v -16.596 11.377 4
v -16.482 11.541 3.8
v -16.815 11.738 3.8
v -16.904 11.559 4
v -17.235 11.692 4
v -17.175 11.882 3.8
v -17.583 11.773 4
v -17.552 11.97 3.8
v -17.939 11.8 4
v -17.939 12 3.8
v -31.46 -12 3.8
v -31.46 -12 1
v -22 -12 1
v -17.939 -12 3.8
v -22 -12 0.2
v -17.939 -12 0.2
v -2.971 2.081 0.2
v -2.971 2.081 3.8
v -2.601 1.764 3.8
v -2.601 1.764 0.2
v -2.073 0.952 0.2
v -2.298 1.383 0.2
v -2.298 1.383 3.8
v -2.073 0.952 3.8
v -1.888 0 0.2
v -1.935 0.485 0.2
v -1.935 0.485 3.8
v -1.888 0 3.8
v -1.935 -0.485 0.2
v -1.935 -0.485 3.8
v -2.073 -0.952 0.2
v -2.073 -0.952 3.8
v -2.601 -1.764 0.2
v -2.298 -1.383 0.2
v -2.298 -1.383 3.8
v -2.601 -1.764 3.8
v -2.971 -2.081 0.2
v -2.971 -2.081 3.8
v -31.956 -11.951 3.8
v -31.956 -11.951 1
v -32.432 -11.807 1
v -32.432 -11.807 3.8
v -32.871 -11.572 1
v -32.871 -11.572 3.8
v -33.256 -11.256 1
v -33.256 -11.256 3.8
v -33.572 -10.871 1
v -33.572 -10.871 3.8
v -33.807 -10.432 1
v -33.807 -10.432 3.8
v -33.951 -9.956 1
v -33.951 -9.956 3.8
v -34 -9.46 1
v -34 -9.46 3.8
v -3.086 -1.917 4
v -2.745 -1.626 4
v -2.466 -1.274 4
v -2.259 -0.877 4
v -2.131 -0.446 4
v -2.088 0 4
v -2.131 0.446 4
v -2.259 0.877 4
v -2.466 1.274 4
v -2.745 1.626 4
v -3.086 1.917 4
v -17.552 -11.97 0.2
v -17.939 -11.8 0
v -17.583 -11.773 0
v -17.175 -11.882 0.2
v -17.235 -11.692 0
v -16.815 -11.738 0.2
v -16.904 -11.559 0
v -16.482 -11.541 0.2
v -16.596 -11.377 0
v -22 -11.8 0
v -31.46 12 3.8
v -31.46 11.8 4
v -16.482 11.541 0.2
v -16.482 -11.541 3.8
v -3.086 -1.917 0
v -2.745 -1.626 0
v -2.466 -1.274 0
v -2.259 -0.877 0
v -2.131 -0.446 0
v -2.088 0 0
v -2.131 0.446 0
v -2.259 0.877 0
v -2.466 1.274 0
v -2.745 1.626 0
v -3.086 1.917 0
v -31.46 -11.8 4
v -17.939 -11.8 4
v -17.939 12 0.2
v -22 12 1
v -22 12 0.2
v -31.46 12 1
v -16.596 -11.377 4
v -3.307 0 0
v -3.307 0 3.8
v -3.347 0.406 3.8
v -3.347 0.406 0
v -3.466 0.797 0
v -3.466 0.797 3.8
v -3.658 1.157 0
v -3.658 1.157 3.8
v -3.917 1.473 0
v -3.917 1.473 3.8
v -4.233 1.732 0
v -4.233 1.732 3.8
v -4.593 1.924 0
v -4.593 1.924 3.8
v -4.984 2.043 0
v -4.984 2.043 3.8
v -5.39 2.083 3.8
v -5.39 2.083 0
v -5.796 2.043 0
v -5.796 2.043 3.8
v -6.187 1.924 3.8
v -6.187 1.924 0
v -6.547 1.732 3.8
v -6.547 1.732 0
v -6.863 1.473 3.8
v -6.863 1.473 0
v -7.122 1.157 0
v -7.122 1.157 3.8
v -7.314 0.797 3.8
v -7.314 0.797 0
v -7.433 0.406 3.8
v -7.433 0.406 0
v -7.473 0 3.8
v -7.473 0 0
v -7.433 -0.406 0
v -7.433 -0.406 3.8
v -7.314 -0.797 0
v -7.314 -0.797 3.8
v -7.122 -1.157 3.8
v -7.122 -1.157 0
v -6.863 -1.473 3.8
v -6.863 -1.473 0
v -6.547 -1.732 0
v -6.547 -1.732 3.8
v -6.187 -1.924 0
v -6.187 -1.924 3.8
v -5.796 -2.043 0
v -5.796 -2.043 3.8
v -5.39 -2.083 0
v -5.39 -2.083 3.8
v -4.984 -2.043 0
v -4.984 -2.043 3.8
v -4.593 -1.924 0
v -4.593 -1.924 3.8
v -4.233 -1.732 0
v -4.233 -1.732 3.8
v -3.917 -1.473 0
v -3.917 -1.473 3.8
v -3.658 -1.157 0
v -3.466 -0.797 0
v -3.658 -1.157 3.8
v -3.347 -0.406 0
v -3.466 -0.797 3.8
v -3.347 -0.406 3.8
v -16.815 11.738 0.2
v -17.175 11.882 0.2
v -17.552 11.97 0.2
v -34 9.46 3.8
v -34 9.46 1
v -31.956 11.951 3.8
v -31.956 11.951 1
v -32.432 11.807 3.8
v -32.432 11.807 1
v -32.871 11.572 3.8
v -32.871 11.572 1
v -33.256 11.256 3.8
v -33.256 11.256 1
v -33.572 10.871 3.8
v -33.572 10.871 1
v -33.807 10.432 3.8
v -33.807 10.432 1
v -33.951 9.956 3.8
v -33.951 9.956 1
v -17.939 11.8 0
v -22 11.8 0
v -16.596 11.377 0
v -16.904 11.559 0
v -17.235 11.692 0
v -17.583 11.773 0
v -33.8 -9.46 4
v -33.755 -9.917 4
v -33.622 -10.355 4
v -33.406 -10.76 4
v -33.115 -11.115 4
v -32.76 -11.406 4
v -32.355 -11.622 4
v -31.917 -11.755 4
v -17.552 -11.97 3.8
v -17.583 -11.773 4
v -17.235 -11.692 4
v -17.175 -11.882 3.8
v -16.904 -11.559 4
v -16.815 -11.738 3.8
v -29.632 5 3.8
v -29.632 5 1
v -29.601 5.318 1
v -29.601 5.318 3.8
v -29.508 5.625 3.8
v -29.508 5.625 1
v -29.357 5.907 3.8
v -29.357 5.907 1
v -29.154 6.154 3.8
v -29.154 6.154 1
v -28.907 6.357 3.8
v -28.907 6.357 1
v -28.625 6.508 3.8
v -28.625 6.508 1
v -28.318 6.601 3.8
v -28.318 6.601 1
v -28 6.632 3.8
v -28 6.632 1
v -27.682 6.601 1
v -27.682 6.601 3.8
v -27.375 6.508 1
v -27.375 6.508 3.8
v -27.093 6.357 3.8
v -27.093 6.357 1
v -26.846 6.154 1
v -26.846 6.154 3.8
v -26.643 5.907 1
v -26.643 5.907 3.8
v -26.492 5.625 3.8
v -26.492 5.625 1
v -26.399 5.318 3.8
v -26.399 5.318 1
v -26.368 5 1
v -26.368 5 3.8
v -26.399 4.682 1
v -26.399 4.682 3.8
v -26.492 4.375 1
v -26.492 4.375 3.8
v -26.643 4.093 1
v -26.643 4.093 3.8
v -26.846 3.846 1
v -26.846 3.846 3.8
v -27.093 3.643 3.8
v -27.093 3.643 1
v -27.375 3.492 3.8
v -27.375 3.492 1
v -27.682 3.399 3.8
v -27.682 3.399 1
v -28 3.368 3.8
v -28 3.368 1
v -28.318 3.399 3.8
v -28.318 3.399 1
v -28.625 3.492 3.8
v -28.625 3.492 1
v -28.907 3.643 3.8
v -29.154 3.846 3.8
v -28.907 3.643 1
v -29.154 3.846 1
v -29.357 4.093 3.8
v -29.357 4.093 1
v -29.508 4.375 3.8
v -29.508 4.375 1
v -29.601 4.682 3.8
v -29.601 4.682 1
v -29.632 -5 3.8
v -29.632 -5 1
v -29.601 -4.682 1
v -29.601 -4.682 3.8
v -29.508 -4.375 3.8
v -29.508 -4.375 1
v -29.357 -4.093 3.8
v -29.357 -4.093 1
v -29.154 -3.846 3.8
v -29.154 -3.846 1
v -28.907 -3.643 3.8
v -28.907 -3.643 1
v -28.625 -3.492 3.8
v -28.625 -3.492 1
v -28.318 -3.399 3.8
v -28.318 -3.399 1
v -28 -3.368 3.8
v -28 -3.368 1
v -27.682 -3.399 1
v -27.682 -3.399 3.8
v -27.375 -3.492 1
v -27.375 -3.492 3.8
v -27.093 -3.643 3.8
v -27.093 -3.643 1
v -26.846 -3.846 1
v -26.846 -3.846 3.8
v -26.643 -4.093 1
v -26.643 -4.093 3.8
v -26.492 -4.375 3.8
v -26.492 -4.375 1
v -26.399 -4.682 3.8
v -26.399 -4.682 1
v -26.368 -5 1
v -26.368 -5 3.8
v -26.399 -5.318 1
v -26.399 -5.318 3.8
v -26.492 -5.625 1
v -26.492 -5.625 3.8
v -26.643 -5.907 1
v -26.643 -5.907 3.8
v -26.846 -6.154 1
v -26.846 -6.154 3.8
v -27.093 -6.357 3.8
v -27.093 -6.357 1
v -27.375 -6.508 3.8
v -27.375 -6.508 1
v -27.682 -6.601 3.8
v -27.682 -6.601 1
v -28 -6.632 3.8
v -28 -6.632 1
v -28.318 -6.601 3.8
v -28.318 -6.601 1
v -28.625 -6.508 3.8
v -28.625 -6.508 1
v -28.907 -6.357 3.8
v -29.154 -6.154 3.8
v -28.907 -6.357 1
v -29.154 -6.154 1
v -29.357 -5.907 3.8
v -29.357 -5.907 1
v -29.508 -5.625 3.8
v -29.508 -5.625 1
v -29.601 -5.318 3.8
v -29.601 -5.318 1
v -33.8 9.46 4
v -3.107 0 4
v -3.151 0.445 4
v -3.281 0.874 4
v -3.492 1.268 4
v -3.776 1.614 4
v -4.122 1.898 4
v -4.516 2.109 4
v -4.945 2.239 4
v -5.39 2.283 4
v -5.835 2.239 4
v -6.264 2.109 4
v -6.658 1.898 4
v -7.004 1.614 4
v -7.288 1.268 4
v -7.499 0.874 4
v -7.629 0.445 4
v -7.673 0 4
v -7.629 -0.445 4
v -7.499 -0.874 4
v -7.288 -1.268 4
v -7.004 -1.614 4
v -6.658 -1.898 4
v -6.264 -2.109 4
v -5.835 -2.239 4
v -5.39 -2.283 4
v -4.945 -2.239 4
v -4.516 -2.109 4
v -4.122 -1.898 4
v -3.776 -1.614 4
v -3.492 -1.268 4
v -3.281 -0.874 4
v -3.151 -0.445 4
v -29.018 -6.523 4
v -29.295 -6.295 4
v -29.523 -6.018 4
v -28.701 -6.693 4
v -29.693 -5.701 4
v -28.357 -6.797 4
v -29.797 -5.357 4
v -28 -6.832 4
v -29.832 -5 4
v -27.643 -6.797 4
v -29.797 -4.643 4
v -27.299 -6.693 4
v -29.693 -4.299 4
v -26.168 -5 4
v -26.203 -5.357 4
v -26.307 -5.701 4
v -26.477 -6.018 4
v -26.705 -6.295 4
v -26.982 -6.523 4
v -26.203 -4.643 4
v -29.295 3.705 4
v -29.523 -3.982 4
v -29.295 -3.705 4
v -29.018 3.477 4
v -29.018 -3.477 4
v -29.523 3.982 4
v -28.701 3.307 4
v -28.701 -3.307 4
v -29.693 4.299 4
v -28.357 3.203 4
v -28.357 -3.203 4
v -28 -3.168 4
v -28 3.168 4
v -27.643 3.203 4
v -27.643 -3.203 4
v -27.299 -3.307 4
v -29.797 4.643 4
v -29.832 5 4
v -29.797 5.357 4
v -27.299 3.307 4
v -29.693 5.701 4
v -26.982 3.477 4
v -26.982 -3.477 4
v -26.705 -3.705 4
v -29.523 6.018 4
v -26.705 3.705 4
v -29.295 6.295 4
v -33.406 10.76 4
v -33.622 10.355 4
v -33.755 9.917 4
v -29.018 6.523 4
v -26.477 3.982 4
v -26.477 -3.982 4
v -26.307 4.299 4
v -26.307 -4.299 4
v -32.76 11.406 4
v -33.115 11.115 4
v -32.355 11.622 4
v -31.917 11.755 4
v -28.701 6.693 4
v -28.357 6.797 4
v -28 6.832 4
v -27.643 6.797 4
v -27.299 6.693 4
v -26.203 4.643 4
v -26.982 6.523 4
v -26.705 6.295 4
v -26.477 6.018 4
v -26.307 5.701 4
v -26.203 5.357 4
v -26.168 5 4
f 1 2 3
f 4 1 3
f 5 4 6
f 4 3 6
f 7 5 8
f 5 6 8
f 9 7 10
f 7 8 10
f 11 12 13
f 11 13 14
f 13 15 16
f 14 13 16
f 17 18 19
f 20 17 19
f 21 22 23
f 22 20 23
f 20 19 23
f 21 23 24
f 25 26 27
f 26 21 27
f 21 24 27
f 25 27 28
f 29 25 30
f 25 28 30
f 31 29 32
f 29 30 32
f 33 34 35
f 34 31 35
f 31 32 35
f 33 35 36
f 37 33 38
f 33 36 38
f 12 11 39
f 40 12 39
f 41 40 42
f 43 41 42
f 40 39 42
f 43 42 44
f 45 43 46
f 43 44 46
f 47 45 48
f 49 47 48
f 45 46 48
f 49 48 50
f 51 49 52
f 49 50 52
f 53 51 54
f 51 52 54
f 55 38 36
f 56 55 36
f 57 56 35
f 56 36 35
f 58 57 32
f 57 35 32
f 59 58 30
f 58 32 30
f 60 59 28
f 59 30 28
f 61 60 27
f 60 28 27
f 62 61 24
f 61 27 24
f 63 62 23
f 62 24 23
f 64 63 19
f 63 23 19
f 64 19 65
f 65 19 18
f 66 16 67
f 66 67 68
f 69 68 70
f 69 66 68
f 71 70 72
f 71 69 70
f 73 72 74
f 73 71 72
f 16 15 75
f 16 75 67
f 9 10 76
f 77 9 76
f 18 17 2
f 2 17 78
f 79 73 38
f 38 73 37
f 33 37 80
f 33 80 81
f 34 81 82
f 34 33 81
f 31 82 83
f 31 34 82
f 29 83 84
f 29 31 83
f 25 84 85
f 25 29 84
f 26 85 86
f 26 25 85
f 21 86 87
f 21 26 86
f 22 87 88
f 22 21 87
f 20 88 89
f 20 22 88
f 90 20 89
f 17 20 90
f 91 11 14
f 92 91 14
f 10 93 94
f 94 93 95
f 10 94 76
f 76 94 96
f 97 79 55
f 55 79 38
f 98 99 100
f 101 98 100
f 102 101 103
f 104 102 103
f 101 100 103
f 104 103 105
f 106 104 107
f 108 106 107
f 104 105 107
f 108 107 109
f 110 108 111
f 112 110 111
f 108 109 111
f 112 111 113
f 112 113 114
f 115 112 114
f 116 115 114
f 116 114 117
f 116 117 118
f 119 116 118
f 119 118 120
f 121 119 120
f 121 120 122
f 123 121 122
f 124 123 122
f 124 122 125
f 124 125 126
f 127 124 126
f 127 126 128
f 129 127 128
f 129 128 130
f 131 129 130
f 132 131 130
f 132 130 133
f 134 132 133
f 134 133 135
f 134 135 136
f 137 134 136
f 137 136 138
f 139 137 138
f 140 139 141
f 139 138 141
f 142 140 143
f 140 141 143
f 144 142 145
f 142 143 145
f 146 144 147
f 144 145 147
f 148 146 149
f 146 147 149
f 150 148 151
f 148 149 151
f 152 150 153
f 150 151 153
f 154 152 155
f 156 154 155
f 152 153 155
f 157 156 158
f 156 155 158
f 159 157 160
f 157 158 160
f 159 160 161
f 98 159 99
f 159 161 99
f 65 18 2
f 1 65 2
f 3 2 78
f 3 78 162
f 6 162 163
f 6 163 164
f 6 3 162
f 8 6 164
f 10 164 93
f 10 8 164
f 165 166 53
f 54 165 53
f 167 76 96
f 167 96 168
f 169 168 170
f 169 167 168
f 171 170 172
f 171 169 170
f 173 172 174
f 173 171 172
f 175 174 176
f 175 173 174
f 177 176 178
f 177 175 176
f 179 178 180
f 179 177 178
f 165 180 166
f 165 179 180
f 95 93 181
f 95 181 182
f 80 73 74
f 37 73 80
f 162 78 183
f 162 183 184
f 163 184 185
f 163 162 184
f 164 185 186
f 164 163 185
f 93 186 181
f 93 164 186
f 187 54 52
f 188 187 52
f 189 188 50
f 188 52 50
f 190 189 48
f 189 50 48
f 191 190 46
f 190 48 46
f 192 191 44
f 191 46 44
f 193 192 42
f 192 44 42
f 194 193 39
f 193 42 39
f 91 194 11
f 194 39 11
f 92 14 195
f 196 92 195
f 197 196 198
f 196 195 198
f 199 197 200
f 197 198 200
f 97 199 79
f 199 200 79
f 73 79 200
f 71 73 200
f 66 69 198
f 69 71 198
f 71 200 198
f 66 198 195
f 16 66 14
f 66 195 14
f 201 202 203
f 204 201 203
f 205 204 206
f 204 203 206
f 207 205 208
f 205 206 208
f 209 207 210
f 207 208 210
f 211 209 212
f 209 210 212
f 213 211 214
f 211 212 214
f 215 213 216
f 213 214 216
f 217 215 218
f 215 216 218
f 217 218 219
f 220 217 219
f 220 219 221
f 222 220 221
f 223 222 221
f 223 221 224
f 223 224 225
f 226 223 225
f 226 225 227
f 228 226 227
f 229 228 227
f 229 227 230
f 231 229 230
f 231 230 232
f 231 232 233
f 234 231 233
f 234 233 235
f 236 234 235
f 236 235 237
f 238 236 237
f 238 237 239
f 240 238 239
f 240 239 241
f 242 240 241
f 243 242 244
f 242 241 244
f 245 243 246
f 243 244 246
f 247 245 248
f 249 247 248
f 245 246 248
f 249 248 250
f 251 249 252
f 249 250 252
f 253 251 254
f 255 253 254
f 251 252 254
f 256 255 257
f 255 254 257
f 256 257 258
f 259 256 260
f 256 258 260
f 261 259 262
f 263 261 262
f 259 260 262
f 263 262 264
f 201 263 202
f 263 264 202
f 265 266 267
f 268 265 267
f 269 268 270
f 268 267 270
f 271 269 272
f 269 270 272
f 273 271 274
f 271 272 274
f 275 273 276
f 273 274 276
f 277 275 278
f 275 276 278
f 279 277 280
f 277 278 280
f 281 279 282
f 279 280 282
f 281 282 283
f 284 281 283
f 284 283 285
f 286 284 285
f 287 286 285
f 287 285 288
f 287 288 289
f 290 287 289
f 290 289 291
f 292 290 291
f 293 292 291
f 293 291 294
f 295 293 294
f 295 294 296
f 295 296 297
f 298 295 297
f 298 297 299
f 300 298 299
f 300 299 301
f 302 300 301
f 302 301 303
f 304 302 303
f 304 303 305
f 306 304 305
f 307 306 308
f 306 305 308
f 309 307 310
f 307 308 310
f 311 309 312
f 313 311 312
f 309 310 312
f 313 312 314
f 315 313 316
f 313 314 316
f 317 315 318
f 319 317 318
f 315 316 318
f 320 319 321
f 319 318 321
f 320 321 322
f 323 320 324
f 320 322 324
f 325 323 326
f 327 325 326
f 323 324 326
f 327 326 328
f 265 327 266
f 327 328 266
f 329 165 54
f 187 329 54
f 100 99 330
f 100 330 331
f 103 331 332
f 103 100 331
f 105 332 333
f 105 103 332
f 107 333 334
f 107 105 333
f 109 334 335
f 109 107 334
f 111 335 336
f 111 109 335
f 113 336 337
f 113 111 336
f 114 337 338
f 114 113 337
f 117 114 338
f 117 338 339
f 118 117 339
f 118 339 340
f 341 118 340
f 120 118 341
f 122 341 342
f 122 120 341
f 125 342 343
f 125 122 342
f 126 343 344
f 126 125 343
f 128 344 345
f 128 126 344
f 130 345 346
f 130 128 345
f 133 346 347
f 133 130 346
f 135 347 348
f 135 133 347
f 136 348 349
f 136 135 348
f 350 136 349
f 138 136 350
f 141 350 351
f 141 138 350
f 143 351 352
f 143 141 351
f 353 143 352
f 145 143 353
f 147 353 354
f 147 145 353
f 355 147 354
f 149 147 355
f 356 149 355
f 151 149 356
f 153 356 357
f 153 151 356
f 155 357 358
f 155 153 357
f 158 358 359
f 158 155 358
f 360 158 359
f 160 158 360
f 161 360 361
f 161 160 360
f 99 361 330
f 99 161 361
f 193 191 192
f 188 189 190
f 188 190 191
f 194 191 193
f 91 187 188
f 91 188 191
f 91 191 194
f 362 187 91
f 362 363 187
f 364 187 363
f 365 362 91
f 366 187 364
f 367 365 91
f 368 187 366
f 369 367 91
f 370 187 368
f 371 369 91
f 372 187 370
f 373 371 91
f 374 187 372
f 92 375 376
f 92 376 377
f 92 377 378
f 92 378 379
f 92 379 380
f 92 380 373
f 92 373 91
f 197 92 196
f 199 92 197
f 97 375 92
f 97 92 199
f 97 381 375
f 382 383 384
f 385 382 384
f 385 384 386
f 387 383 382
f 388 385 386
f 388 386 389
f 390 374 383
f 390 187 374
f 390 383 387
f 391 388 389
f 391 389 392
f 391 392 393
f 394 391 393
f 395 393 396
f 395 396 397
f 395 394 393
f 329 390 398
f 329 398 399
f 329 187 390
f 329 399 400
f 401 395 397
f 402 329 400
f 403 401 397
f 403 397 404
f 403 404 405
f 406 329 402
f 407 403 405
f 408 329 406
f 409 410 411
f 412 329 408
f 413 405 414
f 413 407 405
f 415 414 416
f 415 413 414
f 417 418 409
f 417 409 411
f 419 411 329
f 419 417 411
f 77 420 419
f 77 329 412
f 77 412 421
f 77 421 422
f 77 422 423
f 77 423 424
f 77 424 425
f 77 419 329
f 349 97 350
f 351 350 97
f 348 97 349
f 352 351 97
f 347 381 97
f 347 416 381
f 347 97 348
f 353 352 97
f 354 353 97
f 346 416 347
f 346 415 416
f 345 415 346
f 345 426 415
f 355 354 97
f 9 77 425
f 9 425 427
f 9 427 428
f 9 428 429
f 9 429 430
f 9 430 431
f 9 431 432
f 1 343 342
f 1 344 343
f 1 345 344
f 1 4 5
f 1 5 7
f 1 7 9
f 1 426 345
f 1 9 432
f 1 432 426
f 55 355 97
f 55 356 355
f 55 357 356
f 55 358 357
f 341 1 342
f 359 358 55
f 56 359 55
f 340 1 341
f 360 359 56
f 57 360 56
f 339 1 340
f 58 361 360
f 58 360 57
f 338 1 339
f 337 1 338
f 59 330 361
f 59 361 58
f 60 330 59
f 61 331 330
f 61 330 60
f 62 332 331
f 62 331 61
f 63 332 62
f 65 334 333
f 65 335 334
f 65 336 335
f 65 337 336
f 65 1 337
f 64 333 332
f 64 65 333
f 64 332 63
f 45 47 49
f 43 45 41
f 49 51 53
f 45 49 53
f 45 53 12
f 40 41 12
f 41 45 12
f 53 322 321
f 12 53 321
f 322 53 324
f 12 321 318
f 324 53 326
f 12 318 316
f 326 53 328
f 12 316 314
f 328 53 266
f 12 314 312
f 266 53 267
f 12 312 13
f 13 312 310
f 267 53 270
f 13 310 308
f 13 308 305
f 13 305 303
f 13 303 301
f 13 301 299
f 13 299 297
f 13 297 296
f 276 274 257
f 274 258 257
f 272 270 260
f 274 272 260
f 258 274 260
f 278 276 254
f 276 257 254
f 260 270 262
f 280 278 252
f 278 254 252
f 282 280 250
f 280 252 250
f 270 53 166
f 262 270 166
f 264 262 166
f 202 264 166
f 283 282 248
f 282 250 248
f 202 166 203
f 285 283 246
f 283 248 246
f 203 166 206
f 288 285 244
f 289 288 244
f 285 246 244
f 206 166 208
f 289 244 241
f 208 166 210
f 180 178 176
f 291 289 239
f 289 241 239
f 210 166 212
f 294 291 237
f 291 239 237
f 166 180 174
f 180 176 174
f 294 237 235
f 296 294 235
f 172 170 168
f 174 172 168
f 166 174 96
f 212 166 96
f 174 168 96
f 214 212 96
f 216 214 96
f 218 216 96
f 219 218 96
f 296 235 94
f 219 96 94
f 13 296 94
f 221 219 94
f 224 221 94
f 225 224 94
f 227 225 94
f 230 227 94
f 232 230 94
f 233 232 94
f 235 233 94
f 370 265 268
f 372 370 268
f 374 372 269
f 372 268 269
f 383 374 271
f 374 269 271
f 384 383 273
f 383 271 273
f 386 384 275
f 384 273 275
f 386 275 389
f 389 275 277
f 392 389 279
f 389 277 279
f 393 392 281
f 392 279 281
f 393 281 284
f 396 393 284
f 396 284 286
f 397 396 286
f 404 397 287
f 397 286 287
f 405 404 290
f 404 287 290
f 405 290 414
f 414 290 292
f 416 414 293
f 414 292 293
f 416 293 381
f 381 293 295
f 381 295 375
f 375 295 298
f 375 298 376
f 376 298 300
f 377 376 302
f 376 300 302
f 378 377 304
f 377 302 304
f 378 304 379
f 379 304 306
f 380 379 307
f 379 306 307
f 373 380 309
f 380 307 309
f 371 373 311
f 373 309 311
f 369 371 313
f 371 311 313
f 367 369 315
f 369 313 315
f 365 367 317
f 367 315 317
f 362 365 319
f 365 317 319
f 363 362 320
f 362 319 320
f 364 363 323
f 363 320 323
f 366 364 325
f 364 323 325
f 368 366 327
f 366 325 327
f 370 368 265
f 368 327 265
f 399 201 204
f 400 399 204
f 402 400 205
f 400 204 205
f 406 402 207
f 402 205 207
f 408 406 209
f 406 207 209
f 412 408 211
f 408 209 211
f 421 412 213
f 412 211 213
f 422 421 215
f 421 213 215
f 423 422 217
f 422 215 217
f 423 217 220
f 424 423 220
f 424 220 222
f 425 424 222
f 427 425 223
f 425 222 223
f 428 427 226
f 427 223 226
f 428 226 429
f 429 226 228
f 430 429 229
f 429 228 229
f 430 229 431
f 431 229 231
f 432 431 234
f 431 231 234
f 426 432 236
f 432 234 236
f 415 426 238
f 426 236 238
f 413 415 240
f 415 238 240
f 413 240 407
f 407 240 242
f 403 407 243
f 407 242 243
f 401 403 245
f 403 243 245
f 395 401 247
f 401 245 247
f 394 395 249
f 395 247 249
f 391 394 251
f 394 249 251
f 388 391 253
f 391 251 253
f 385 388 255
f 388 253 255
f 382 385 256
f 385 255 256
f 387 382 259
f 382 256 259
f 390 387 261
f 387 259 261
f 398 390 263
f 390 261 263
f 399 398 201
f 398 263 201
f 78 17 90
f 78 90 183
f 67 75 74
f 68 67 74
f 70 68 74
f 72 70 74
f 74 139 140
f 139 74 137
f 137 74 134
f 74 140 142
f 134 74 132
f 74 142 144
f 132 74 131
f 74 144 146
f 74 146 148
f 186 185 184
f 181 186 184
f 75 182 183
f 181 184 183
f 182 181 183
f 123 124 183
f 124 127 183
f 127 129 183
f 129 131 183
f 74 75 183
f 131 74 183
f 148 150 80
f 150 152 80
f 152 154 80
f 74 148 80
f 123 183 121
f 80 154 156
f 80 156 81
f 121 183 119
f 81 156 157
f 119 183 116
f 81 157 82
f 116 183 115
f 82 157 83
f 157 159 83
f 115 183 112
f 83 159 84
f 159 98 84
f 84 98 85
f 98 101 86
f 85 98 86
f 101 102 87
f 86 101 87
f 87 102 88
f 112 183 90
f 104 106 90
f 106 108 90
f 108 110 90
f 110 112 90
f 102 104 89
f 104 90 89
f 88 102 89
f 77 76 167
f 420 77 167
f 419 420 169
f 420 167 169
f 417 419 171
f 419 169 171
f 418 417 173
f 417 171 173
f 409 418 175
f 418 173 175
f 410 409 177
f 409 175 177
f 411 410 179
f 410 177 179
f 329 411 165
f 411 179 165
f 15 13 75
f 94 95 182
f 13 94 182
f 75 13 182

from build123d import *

# Parameters (mm, degrees)
EXTRUDE1_DEPTH                  = 4
SKETCH2_W                       = 12
SKETCH2_H                       = 1
EXTRUDE2_DEPTH                  = 25
F_4_CLEARANCE_HOLE1_D           = 3.2639
F_4_CLEARANCE_HOLE1_DEPTH       = 8.382
F_4_CLEARANCE_HOLE1_TIP         = 0.980574487
F_8_32_TAPPED_HOLE1_D           = 3.4544
F_8_32_TAPPED_HOLE1_DEPTH       = 10.7188
F_8_32_TAPPED_HOLE1_CBORE_D     = 4.1656
F_8_32_TAPPED_HOLE1_CBORE_DEPTH = 8.3312
F_8_32_TAPPED_HOLE1_TIP         = 1.037806461
FILLET1_R                       = 2.54
CHAMFER1_SIZE                   = 0.2


with BuildPart() as part:
    # Sketch1 → Extrude1 (new body)
    with BuildSketch(Plane.XY):
        Polygon((0, 0), (-17.137776081, 12), (-34, 12), (-34, 0), (-34, -12), (-17.137776081, -12), align=None)
    extrude(amount=EXTRUDE1_DEPTH)

    # Sketch2 → Extrude2 (cut, through all)
    with BuildSketch(Plane(origin=(0, 12, 0), x_dir=(1, 0, 0), z_dir=(0, 1, 0))):
        with Locations((-28, -0.5)):
            Rectangle(SKETCH2_W, SKETCH2_H)
    extrude(amount=-EXTRUDE2_DEPTH, mode=Mode.SUBTRACT)

    # #4 Clearance Hole1
    with Locations(Plane(origin=(-28, 5, 4), x_dir=(1, 0, 0), z_dir=(0, 0, 1))):
        with Locations((0, 0), (0, -10)):
            Hole(F_4_CLEARANCE_HOLE1_D / 2, depth=F_4_CLEARANCE_HOLE1_DEPTH)
            with Locations((0, 0, -(F_4_CLEARANCE_HOLE1_DEPTH + F_4_CLEARANCE_HOLE1_TIP / 2))):  # 118° drill point
                Cone(0, F_4_CLEARANCE_HOLE1_D / 2, F_4_CLEARANCE_HOLE1_TIP, mode=Mode.SUBTRACT)

    # #8-32 Tapped Hole1
    with Locations(Plane(origin=(-5.39, 0, 4), x_dir=(1, 0, 0), z_dir=(0, 0, 1))):
        with Locations((0, 0)):
            CounterBoreHole(F_8_32_TAPPED_HOLE1_D / 2, F_8_32_TAPPED_HOLE1_CBORE_D / 2, F_8_32_TAPPED_HOLE1_CBORE_DEPTH, depth=F_8_32_TAPPED_HOLE1_DEPTH)
            with Locations((0, 0, -(F_8_32_TAPPED_HOLE1_DEPTH + F_8_32_TAPPED_HOLE1_TIP / 2))):  # 118° drill point
                Cone(0, F_8_32_TAPPED_HOLE1_D / 2, F_8_32_TAPPED_HOLE1_TIP, mode=Mode.SUBTRACT)

    # Fillet1
    fillet1_edges = [part.edges().sort_by_distance(p)[0] for p in [
        (-17.137776081, -12, 2),
        (-34, -12, 2.5),
        (-34, 12, 2.5),
        (-17.137776081, 12, 2),
        (0, 0, 2),
    ]]
    fillet(fillet1_edges, radius=FILLET1_R)

    # Chamfer1
    chamfer1_edges = [part.edges().sort_by_distance(p)[0] for p in [
        (-19.969317502, -12, 0),
        (-26.36805, -5, 4),
        (-26.36805, 5, 4),
        (-7.4728, 0, 4),
        (-24.699317502, -12, 4),
        (-34, 0, 4),
        (-9.726610784, -6.810646192, 4),
        (-9.726610784, 6.810646192, 4),
        (-24.699317502, 12, 4),
        (-33.256051224, 11.256051224, 4),
        (-17.174842274, 11.882441055, 4),
        (-1.888354861, 0, 4),
        (-17.174842274, -11.882441055, 4),
        (-33.256051224, -11.256051224, 4),
        (-9.726610784, -6.810646192, 0),
        (-19.969317502, 12, 0),
        (-9.726610784, 6.810646192, 0),
        (-17.174842274, 11.882441055, 0),
        (-1.888354861, 0, 0),
        (-17.174842274, -11.882441055, 0),
    ]]
    chamfer(chamfer1_edges, length=CHAMFER1_SIZE)


solid = part.part
